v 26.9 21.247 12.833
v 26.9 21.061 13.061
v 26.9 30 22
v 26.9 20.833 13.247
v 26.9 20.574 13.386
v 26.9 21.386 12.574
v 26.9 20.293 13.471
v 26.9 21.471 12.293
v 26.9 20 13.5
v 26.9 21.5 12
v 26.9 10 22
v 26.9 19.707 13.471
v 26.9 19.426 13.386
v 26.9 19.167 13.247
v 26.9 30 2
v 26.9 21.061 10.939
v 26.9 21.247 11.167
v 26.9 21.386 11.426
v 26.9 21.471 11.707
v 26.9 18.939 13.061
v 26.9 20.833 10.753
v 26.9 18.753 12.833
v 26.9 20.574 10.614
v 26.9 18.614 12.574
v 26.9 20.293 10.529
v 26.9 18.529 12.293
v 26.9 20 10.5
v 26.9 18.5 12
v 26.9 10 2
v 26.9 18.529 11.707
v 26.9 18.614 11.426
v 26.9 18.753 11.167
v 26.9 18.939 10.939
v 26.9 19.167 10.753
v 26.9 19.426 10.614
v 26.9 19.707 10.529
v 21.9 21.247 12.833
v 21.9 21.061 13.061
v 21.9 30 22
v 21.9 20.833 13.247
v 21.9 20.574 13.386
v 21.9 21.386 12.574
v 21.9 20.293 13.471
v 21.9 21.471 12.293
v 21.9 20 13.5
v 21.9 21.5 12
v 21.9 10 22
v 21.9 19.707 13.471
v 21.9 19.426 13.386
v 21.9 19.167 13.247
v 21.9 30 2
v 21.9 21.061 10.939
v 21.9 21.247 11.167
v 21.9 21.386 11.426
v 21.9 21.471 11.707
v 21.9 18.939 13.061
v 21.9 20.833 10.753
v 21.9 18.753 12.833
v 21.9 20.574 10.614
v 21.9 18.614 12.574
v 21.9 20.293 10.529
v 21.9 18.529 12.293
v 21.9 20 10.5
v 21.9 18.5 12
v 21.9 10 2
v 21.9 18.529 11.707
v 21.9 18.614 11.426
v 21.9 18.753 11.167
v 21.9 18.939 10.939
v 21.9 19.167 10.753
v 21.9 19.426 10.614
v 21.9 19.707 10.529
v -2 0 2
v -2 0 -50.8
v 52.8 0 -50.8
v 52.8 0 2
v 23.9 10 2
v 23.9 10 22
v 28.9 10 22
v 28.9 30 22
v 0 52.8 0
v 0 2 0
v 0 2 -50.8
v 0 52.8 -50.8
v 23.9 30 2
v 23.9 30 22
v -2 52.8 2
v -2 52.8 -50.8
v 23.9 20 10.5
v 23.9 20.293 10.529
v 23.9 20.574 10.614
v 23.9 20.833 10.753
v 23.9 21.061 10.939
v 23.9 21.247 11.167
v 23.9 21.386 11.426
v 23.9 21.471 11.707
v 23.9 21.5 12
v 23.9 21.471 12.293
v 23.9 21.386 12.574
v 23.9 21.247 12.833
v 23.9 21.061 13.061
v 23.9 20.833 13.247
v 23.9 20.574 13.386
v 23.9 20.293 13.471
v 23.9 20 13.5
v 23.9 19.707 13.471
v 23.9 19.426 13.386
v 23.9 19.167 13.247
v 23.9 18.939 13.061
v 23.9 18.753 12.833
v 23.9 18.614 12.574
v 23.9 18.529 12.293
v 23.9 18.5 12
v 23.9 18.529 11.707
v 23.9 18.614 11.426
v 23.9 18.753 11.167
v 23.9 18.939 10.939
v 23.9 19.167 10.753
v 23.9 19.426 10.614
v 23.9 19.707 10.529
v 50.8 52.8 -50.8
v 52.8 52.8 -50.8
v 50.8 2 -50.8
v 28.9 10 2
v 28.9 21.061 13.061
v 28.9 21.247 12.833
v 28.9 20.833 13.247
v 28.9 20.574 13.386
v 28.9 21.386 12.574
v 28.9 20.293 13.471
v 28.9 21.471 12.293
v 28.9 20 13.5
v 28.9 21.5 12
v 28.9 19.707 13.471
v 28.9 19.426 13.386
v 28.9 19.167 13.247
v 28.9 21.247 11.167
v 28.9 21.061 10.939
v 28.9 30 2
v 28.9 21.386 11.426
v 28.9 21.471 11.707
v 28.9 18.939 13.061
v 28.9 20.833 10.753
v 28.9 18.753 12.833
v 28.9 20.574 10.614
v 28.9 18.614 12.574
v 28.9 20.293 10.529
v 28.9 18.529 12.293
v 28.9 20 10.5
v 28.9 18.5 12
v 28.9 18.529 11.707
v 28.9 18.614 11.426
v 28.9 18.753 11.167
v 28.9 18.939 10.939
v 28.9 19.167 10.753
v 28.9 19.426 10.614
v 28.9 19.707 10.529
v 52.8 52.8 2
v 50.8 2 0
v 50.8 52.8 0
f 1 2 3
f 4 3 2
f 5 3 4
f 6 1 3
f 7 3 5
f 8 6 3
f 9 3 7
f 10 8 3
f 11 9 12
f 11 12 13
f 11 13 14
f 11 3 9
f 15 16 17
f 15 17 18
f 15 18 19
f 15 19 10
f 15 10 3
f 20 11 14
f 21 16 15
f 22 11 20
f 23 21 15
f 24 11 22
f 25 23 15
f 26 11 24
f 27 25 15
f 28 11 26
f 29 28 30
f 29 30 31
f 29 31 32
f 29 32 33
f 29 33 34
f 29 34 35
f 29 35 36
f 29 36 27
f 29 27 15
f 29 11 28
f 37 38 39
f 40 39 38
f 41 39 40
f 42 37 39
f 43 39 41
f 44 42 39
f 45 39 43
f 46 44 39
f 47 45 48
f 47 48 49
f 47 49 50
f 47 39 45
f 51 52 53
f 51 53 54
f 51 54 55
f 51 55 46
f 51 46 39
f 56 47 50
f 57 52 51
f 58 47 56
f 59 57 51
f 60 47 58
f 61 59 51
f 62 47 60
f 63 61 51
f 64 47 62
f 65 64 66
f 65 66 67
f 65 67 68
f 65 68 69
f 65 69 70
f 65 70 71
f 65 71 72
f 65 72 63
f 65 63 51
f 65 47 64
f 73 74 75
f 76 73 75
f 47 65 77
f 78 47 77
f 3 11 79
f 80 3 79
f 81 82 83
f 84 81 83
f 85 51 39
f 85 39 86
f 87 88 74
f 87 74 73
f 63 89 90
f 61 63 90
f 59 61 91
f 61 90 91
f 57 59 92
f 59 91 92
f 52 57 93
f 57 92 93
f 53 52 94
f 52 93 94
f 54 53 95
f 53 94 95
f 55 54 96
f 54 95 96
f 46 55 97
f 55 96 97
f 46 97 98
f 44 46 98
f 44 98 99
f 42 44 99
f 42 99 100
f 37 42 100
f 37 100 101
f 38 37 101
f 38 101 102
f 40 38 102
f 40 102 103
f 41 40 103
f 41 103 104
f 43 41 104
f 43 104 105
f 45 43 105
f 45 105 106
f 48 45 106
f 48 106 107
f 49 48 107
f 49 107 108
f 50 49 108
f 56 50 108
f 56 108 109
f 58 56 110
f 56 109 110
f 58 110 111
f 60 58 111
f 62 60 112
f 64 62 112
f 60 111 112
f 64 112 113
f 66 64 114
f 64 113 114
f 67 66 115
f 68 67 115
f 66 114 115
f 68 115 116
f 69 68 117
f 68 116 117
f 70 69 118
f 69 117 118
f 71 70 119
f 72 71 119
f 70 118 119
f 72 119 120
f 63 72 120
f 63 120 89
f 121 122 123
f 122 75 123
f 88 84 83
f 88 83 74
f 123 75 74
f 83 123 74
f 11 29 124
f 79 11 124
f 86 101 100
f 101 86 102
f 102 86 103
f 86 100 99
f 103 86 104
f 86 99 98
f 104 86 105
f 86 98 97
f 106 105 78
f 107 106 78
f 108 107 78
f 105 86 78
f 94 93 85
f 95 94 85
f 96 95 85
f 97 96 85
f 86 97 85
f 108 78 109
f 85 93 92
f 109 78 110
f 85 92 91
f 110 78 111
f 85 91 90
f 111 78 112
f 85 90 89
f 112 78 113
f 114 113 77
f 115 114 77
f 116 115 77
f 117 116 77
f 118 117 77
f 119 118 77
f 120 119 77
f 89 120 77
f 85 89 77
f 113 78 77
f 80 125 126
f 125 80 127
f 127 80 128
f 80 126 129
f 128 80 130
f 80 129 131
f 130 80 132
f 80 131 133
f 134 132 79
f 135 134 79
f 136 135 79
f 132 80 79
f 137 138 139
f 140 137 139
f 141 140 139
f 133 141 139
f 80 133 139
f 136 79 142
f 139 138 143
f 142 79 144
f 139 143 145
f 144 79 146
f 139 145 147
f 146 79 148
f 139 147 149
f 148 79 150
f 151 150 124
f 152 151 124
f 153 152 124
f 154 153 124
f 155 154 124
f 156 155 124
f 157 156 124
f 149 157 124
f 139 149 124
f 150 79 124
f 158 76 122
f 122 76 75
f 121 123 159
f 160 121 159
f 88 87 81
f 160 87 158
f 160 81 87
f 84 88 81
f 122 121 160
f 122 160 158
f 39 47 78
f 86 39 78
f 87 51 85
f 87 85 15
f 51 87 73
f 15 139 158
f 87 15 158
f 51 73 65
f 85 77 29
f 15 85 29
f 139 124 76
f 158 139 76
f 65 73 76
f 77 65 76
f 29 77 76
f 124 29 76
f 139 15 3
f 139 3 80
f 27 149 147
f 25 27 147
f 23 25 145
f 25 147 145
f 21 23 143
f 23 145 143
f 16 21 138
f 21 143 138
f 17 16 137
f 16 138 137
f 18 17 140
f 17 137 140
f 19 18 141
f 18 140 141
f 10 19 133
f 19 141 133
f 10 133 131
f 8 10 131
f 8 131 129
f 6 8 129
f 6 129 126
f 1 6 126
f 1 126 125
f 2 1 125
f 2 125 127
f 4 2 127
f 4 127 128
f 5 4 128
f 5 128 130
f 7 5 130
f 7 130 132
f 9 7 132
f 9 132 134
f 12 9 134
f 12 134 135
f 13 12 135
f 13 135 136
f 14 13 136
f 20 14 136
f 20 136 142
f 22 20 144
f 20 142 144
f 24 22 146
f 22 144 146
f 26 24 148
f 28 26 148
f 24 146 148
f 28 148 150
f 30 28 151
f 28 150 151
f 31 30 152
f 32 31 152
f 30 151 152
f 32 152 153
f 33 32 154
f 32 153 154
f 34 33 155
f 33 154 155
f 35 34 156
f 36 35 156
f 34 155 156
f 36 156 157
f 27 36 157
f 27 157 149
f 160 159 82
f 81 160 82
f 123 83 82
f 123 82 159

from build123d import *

# Parameters (mm, degrees)
SKETCH1_W                = 50.8
SKETCH1_H                = 50.8
BOSS_EXTRUDE1_DEPTH      = 2
BOSS_EXTRUDE2_START      = 2
BOSS_EXTRUDE2_DEPTH      = 50.8
BOSS_EXTRUDE3_DEPTH      = 10
BOSS_EXTRUDE3_DEPTH_BACK = 10
BOSS_EXTRUDE3_START      = 20
SKETCH1_4_W              = 2
SKETCH1_4_H              = 20
CUT_EXTRUDE1_REACH       = 81.519
SKETCH3_R                = 1.5


with BuildPart() as part:
    # Sketch1 → Boss-Extrude1 (new body)
    with BuildSketch(Plane(origin=(0, 0, 0), x_dir=(1, 0, 0), z_dir=(0, 1, 0))):
        Polygon((52.8, -2), (52.8, 50.8), (50.8, 50.8), (50.8, 0), (0, 0), (0, 50.8), (-2, 50.8), (-2, -2), align=None)
        with Locations((25.4, 25.4)):
            Rectangle(SKETCH1_W, SKETCH1_H)
    extrude(amount=BOSS_EXTRUDE1_DEPTH)

    # Sketch1<3> → Boss-Extrude2 (add)
    with BuildSketch(Plane(origin=(0, 0, 0), x_dir=(1, 0, 0), z_dir=(0, 1, 0)).offset(BOSS_EXTRUDE2_START)):
        Polygon((52.8, -2), (52.8, 50.8), (50.8, 50.8), (50.8, 0), (0, 0), (0, 50.8), (-2, 50.8), (-2, -2), align=None)
    extrude(amount=BOSS_EXTRUDE2_DEPTH)

    # Sketch1<4> → Boss-Extrude3 (add, two sides: drawn at the far end of the back side and taken through both)
    with BuildSketch(Plane(origin=(0, 0, 0), x_dir=(1, 0, 0), z_dir=(0, 1, 0)).offset(BOSS_EXTRUDE3_START - BOSS_EXTRUDE3_DEPTH_BACK)):
        with Locations((27.9, -12)):
            Rectangle(SKETCH1_4_W, SKETCH1_4_H)
        with Locations((22.9, -12)):
            Rectangle(SKETCH1_4_W, SKETCH1_4_H)
    extrude(amount=BOSS_EXTRUDE3_DEPTH + BOSS_EXTRUDE3_DEPTH_BACK)

    # Cut-Extrude1: up to this face of the body (flat: up to its plane)
    cut_extrude1_end = Plane(part.part.faces().sort_by_distance((21.9, 20, 12))[0])
    # Sketch3 → Cut-Extrude1 (cut, up to the picked face)
    with BuildSketch(Plane(origin=(28.9, 0, 0), x_dir=(0, 0, -1), z_dir=(1, 0, 0)), mode=Mode.PRIVATE) as cut_extrude1_sk1:
        with Locations((-12, 20)):
            Circle(SKETCH3_R)
    cut_extrude1_tool1 = split(extrude(cut_extrude1_sk1.sketch, amount=-CUT_EXTRUDE1_REACH, mode=Mode.PRIVATE), bisect_by=cut_extrude1_end, keep=Keep.BOTH, mode=Mode.PRIVATE)
    add(cut_extrude1_tool1.solids().sort_by(Axis((28.9, 20, 12), (-1, 0, 0)))[0], mode=Mode.SUBTRACT)


solid = part.part
